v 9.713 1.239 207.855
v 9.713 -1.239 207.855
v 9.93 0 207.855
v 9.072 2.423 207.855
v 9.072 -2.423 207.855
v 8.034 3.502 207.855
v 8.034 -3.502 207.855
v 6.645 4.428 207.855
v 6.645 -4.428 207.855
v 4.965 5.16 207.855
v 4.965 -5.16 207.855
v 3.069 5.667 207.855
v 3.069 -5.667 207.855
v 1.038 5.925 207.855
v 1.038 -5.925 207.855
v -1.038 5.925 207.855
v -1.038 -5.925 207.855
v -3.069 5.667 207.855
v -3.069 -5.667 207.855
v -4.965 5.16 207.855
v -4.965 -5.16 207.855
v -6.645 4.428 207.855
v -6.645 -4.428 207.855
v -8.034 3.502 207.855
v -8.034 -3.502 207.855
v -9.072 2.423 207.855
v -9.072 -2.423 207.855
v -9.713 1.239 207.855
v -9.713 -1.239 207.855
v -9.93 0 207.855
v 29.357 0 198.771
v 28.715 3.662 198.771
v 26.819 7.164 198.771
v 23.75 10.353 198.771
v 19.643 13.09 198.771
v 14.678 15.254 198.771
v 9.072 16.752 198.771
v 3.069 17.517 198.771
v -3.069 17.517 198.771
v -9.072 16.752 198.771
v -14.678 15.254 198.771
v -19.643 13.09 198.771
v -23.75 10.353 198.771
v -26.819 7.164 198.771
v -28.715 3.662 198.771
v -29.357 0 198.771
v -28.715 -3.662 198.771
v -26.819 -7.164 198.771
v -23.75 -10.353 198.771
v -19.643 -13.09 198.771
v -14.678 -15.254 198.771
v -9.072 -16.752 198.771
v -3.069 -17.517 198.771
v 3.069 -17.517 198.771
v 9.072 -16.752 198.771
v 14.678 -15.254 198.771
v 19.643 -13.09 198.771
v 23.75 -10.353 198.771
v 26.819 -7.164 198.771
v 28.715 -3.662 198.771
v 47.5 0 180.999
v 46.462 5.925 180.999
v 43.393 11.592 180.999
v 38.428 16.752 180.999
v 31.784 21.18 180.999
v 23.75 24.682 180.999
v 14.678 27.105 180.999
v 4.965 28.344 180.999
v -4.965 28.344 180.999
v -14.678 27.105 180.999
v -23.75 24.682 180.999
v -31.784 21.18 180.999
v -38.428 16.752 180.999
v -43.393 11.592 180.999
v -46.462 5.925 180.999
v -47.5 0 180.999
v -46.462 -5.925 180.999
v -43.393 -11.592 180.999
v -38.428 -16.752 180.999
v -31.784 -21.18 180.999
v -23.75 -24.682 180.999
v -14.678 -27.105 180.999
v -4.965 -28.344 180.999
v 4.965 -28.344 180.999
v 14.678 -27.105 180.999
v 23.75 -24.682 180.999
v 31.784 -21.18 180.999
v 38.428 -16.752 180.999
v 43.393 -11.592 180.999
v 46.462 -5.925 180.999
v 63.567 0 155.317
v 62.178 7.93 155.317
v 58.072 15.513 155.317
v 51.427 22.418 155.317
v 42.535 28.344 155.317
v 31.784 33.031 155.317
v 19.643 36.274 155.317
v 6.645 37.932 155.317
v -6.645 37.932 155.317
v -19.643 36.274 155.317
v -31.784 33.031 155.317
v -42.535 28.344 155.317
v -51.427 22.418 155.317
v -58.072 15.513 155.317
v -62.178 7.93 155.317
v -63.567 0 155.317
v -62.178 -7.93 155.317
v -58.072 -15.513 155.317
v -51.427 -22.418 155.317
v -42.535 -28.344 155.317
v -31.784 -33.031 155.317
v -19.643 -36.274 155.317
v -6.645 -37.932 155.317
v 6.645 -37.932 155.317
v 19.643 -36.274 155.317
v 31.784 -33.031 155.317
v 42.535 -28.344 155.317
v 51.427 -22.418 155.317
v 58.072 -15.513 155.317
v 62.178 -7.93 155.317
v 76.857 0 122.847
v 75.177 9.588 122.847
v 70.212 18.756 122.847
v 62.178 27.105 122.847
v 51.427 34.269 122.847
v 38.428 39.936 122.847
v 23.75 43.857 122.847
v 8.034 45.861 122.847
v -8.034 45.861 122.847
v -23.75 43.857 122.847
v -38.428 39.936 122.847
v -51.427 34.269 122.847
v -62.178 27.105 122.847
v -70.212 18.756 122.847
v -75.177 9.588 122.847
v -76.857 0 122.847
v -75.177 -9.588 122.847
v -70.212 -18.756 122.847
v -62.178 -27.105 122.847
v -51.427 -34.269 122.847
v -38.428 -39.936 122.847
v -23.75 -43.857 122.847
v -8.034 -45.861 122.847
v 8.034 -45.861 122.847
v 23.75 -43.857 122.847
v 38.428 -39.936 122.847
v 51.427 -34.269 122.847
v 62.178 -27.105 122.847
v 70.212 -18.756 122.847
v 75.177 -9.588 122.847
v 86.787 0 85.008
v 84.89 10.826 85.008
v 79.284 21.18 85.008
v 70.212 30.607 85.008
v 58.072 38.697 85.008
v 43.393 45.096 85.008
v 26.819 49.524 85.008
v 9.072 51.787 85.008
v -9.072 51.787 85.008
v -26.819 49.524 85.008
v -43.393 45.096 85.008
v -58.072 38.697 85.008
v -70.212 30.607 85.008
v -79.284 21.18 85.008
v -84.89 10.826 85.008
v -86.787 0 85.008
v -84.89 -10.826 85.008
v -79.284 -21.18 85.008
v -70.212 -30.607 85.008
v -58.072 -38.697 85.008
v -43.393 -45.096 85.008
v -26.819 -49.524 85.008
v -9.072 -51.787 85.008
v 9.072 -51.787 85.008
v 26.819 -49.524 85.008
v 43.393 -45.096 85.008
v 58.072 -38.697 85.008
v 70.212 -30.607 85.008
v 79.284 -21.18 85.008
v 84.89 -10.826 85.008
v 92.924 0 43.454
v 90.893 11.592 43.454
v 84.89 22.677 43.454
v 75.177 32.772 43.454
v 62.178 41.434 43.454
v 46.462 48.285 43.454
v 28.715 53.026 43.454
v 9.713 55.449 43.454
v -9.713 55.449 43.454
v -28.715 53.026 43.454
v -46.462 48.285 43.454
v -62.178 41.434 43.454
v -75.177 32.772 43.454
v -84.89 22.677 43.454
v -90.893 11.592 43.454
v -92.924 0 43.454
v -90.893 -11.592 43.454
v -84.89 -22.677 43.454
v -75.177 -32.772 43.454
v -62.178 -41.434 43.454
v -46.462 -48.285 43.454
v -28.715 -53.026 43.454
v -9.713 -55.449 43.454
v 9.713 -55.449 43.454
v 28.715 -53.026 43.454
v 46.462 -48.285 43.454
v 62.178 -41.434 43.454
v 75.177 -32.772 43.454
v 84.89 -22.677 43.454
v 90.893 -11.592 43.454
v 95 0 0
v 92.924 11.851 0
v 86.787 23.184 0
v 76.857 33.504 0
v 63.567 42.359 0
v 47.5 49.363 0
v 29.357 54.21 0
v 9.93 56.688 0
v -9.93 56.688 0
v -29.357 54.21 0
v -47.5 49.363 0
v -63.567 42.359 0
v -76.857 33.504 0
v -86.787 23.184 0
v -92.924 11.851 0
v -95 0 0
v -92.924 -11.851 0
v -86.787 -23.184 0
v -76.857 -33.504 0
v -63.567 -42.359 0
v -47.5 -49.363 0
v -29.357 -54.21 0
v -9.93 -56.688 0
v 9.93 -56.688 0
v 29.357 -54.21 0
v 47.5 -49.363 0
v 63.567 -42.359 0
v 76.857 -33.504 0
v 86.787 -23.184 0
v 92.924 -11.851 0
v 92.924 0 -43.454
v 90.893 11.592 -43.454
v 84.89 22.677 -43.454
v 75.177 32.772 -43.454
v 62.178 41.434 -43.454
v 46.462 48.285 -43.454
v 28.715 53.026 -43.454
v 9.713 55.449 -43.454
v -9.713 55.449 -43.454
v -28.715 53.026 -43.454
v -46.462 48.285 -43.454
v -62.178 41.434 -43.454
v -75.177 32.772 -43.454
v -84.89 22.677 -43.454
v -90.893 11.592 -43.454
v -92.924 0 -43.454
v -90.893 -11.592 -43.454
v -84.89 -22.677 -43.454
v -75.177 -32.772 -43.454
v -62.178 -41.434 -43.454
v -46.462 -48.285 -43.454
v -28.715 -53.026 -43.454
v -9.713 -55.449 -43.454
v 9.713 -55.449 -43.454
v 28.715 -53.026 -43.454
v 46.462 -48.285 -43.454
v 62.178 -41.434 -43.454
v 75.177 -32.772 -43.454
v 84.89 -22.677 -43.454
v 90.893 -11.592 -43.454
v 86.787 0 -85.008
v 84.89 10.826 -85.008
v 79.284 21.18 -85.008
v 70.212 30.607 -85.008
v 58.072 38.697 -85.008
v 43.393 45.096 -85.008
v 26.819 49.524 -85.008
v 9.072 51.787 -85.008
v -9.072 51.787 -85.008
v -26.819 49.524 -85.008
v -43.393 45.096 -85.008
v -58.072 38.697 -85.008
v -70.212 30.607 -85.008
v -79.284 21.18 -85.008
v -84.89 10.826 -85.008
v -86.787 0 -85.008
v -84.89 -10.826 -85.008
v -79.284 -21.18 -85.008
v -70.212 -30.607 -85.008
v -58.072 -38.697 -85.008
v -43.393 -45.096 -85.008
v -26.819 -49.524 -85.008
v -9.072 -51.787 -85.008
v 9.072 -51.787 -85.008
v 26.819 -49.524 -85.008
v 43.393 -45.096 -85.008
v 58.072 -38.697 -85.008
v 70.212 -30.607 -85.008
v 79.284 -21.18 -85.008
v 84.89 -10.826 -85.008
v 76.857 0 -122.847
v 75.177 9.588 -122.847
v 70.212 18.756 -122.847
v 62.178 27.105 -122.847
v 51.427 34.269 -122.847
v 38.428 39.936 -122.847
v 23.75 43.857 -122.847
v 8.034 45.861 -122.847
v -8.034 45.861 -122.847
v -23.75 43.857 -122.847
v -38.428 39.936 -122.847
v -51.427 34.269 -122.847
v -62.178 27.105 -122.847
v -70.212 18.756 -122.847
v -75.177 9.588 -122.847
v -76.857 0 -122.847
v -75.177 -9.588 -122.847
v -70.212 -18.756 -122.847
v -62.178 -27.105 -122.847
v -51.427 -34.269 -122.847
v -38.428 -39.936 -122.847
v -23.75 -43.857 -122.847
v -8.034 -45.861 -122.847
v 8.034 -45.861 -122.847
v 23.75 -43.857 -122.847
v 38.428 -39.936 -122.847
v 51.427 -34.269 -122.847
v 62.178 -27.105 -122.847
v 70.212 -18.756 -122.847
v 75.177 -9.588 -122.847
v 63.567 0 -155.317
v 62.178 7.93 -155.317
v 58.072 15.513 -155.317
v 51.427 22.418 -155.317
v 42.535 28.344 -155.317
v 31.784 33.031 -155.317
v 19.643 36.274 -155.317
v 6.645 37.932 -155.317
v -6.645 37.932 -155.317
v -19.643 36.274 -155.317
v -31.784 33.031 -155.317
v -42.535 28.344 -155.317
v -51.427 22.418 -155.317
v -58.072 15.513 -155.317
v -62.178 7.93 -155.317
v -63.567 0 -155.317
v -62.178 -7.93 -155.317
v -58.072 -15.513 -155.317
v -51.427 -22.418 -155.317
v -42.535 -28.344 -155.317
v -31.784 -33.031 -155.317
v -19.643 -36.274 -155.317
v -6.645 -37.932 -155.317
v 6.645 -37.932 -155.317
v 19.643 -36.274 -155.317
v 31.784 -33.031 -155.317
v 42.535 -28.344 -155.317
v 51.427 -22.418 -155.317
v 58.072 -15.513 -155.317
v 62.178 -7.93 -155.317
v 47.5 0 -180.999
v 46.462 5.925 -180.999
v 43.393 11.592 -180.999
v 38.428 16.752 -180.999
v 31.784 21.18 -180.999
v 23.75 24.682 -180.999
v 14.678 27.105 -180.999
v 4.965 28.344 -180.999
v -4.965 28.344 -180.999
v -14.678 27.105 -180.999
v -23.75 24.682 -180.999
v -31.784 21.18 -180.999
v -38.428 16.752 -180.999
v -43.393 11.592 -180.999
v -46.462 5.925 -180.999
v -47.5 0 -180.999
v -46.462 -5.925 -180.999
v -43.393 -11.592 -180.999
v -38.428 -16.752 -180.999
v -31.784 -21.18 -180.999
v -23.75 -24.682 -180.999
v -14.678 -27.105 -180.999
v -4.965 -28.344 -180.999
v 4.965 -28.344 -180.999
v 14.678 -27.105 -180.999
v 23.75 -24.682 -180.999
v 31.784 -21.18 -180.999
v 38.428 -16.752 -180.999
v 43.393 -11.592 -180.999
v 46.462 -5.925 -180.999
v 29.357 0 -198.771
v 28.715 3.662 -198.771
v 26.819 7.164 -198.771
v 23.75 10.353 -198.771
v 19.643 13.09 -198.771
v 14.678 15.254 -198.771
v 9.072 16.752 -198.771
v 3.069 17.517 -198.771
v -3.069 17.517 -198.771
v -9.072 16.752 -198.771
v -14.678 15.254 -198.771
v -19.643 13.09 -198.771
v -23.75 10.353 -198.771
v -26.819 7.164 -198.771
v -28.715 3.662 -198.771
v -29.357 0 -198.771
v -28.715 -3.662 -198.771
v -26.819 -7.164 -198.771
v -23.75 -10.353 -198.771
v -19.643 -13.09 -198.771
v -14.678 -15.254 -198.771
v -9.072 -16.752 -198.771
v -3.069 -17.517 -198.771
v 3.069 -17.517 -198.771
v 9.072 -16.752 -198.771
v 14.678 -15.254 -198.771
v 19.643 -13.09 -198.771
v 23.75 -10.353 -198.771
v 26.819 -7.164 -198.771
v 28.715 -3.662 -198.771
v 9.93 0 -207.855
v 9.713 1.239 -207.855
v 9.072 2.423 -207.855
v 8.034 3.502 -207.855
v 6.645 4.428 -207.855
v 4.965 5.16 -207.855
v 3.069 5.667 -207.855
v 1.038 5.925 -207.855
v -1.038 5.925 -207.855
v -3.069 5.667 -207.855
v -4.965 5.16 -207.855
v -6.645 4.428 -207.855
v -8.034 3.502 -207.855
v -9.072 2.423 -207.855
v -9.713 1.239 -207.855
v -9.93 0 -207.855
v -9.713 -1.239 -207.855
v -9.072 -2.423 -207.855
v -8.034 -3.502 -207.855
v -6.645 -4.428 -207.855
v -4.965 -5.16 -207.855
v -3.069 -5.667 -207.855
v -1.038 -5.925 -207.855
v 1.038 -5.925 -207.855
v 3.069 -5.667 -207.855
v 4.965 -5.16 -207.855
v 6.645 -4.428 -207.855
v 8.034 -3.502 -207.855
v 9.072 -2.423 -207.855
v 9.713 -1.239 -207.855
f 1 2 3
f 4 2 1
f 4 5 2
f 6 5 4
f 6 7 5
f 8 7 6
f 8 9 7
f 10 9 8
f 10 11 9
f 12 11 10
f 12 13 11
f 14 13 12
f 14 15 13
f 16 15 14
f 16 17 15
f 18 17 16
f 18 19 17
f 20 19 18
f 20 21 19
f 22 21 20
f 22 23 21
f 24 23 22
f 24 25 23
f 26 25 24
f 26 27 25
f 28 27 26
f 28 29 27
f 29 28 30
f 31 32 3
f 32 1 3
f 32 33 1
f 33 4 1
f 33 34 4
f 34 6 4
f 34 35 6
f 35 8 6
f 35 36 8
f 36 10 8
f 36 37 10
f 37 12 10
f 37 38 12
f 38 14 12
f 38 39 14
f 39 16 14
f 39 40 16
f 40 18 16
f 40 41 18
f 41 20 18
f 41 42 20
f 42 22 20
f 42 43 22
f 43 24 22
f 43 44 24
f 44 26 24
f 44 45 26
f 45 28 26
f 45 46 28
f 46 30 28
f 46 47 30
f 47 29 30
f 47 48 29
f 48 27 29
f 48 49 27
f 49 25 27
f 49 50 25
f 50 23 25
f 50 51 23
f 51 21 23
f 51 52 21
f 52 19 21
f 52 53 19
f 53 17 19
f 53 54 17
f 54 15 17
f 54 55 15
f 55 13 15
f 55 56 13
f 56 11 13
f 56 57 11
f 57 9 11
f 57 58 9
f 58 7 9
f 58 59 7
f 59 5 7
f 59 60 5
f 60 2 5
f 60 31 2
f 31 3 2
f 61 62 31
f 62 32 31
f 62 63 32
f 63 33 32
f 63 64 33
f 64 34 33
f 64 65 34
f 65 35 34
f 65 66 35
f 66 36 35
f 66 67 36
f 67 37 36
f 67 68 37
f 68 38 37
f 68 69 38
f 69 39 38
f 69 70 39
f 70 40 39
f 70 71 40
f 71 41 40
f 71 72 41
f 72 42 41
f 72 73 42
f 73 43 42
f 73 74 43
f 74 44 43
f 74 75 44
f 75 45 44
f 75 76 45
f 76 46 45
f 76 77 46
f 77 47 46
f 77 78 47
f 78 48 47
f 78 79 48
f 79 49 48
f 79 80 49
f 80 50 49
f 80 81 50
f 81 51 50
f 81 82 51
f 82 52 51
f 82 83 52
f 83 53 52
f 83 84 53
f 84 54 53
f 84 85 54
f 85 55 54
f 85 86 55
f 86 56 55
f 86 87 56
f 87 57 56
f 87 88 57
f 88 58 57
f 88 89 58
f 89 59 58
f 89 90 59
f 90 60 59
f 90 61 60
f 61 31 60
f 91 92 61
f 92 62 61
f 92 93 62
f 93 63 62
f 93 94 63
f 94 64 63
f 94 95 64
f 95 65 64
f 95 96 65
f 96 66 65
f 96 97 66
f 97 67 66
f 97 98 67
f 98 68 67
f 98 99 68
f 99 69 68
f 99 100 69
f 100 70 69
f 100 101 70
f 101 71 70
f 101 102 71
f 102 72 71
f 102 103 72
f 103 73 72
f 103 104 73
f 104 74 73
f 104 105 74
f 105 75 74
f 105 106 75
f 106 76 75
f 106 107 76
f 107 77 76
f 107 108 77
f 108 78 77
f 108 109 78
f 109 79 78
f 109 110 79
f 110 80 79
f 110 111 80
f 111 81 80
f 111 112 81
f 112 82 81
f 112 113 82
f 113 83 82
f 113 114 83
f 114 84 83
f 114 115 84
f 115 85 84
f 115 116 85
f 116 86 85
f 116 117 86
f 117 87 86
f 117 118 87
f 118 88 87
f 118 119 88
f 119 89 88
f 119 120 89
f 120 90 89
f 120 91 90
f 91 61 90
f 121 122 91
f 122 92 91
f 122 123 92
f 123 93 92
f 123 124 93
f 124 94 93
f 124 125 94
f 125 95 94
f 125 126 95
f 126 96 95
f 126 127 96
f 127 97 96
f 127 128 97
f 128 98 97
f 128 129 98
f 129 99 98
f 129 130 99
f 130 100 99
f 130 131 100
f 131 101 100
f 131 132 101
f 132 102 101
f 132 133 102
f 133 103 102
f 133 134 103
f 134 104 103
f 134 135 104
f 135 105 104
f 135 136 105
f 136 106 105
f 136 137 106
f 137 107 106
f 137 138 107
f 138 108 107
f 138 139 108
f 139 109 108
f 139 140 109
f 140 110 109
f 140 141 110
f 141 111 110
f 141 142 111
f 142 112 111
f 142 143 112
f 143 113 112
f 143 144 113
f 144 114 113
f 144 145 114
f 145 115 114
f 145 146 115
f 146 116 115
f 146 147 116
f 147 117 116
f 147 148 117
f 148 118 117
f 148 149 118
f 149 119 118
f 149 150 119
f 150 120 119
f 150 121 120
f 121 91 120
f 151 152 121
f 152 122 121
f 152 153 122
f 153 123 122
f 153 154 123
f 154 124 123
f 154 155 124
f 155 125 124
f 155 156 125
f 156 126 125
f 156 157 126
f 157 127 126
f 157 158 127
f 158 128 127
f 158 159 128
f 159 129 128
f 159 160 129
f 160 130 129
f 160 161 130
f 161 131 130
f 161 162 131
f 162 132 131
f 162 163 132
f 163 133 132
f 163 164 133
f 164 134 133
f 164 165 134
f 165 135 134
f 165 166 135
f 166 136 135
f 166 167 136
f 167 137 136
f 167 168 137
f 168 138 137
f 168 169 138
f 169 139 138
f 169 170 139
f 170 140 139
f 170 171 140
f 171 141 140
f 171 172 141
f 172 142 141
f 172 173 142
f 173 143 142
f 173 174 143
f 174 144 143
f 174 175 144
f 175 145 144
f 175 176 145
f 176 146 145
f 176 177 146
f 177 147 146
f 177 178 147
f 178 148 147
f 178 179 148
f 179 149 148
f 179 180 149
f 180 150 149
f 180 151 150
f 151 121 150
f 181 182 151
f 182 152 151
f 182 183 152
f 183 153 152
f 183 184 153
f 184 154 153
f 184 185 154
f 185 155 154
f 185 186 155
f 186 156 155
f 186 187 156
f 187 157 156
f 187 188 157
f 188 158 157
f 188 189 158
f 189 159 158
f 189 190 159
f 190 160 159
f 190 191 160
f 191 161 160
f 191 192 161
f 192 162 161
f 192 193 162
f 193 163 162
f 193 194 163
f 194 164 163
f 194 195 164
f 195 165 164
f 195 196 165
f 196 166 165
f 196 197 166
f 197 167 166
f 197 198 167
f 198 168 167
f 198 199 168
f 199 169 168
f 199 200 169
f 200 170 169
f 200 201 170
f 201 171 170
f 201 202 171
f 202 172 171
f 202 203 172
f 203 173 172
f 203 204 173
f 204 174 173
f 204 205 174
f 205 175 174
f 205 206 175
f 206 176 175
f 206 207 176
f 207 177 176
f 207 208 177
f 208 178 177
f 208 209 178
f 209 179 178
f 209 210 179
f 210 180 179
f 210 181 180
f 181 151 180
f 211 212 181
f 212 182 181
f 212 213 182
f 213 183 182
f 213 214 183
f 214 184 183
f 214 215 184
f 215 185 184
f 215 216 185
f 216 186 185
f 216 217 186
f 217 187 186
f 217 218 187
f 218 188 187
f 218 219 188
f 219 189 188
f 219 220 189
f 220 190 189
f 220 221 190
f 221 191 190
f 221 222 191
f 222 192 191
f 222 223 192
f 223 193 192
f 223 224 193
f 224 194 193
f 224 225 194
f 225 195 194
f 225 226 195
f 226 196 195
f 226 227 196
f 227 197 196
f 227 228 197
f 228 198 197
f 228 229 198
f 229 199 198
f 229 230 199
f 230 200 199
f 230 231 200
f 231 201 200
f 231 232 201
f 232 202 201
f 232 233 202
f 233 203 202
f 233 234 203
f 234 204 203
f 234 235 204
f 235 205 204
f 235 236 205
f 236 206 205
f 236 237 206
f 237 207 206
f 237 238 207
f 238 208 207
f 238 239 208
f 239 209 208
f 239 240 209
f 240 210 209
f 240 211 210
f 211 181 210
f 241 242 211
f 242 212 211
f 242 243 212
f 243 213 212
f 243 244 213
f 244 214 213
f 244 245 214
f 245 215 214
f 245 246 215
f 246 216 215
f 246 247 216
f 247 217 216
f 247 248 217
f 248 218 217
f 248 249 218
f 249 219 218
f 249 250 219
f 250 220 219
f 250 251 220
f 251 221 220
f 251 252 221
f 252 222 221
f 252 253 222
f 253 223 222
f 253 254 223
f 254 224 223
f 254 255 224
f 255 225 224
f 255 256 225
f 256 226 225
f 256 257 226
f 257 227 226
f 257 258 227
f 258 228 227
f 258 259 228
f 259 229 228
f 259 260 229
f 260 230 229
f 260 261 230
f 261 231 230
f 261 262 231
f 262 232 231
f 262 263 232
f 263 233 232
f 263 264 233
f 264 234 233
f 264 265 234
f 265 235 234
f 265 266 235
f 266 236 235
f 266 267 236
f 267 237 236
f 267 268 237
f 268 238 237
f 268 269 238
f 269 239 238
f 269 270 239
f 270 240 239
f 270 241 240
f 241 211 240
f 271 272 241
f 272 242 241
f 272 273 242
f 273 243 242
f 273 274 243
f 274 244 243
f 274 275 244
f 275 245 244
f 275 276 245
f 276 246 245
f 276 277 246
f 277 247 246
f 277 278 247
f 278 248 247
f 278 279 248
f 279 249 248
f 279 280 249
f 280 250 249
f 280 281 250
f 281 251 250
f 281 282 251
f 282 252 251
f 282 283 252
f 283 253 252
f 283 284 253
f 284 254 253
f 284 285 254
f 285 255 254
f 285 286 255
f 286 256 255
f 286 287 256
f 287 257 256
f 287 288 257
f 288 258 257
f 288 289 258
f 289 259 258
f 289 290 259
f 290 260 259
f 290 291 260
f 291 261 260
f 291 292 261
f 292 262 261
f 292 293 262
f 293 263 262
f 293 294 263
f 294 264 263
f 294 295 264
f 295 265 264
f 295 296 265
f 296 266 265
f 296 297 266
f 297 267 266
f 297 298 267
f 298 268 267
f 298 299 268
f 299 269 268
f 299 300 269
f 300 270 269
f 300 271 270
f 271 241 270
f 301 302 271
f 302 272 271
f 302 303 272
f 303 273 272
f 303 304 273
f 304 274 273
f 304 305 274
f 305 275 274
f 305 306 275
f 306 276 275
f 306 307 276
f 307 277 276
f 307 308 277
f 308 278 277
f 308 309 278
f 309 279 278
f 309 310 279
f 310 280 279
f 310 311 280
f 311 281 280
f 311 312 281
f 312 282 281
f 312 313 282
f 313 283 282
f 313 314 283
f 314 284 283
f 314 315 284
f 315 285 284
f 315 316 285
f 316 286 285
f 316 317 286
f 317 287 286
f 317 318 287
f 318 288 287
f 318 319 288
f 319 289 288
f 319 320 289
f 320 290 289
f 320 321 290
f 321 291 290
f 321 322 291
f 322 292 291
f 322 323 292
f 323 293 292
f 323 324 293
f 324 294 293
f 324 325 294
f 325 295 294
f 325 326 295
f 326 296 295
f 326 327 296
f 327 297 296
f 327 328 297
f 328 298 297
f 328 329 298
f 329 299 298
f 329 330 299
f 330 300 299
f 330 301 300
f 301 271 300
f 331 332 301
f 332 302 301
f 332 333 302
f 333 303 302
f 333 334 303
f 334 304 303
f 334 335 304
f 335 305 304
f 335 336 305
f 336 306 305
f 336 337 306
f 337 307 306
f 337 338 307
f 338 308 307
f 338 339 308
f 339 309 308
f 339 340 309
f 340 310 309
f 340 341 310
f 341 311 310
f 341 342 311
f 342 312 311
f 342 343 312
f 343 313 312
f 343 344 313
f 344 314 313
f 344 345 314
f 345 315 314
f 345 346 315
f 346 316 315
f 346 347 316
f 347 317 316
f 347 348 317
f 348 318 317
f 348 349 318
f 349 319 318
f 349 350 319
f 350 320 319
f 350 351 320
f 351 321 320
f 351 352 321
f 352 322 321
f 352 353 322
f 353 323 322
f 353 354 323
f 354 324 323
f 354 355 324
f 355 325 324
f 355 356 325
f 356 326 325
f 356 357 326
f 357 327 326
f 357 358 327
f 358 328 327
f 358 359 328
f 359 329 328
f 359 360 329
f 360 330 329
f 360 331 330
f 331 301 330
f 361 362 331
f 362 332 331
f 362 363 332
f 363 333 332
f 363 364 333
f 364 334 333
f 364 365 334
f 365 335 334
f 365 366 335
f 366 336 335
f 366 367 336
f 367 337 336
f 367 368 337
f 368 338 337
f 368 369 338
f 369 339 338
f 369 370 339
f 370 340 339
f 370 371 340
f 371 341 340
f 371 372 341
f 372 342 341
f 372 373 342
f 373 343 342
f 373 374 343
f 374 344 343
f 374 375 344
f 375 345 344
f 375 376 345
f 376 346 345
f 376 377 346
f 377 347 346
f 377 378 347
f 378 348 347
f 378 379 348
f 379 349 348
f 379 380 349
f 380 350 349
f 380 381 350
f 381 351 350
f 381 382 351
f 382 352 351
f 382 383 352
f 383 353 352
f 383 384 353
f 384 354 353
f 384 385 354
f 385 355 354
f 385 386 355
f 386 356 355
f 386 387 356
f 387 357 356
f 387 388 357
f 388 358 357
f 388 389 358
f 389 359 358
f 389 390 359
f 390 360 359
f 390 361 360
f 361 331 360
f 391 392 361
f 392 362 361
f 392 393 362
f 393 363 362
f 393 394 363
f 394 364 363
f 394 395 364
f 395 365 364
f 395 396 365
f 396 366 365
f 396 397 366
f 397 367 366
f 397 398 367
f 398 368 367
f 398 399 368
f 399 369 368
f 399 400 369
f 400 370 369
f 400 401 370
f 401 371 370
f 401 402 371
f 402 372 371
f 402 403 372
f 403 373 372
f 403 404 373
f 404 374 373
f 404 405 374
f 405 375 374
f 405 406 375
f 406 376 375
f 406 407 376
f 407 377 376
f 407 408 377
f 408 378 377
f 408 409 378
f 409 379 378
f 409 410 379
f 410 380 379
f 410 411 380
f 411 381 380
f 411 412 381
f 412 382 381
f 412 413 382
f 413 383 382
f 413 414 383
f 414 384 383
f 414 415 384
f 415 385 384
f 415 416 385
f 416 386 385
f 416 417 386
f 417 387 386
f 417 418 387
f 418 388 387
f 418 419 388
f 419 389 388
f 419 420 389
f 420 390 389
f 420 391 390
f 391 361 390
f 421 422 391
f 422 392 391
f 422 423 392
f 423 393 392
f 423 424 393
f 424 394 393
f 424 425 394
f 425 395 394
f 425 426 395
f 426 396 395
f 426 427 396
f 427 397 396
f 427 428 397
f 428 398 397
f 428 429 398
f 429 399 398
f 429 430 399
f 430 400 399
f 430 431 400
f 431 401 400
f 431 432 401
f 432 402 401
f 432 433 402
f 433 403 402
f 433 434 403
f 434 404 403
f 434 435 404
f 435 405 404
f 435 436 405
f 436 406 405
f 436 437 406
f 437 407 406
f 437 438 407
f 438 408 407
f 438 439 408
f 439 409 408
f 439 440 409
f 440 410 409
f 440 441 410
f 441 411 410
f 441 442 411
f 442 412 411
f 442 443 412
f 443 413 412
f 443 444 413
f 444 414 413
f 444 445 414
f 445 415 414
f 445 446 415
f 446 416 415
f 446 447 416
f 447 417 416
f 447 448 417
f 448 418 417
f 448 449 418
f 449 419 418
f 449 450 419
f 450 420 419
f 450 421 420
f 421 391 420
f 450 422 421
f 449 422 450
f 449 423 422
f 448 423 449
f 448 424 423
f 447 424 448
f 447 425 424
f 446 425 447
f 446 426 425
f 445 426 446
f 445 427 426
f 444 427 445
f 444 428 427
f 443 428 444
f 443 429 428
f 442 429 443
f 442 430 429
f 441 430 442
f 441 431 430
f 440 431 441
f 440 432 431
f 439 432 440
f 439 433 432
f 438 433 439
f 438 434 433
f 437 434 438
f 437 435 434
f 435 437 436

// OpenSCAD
// Generated by SolidPython 1.0.1 on 2020-07-29 00:46:46


scale(v = [5, 3, 11]) {
	sphere(r = 19);
}
/***********************************************
*********      SolidPython code:      **********
************************************************
 
# import packages: SolidPython
from solid import *
from solid.utils import *
from itertools import chain, combinations, permutations


class Resize:

    def __init__(self, scad_file):
        self.scad_file = scad_file
        #self.scad_file = import_scad(scad_file)
        # cone/cylinder param:
        self.r1 = 0
        self.r2 = 0
        self.h = 0
        # rectangular prism param:
        self.w = 0
        self.l = 0
        # ellipse param:
        self.r = 0

    # import OpenScad code (file name corresponds to shape)


    # classify shape + parameters
    def assign(self, param1, param2, param3):
        if self.scad_file == 'cone.scad':
            self.r1 = param1
            self.r2 = param2
            self.h = param3
        elif self.scad_file == 'cylinder.scad':
            self.r1 = param1
            self.r2 = param2
            self.h = param3
        elif self.scad_file == 'rectangularPrism.scad':
            self.h = param1
            self.l = param2
            self.w = param3
        else:
            self.r = param1
            self.h = param2

    # resize parameters
    def iterate(self):
        x = range(3, 20, 2)
        i = 1
        if self.scad_file == 'cone.scad':
            tempList = list(permutations(x, 2))
            for temp in tempList:
                param1 = temp[0]
                param2 = temp[1]
                filepath = 'produced_scad_files/' + 'cone' + str(param1) + '_' + str(param2) + '_' + '.scad'
                scad_render_to_file(cylinder(h=param1, r1=param2, r2=0), filepath)

        elif self.scad_file == 'cylinder.scad':
            tempList = list(permutations(x, 3))
            for temp in tempList:
                param1 = temp[0]
                param2 = temp[1]
                filepath = 'produced_scad_files/' + 'cylinder' + str(param1) + '_' + str(param2) + '_' + '.scad'
                scad_render_to_file(cylinder(h=param1, r1=param2, r2=param2), filepath)

        elif self.scad_file == 'rectangularPrism.scad':
            tempList = list(permutations(x, 3))
            for temp in tempList:
                param1 = temp[0]
                param2 = temp[1]
                param3 = temp[2]
                filepath = 'produced_scad_files/' + 'rectangularPrism' + str(param1) + '_' + str(param2) + '_' + str(
                    param3) + '.scad'
                scad_render_to_file(cube(size=(param1, param2, param3)), filepath)

        elif self.scad_file == 'ellipse.scad':
            tempList = list(permutations(x, 4))
            for temp in tempList:
                param1 = temp[0]
                param2 = temp[1]
                param3 = temp[2]
                param4 = temp[3]
                filepath = 'produced_scad_files/' + 'ellipse' + str(param1) + '_' + str(param2) + '_' + str(param3) + '_' + str(param4) + '.scad'
                scad_render_to_file(scale([param1, param2, param3])(sphere(r=param4)), filepath)

    def render_to_scadfile(self):
        scad_render_to_file(scad, 'example.scad') 
 
************************************************/
